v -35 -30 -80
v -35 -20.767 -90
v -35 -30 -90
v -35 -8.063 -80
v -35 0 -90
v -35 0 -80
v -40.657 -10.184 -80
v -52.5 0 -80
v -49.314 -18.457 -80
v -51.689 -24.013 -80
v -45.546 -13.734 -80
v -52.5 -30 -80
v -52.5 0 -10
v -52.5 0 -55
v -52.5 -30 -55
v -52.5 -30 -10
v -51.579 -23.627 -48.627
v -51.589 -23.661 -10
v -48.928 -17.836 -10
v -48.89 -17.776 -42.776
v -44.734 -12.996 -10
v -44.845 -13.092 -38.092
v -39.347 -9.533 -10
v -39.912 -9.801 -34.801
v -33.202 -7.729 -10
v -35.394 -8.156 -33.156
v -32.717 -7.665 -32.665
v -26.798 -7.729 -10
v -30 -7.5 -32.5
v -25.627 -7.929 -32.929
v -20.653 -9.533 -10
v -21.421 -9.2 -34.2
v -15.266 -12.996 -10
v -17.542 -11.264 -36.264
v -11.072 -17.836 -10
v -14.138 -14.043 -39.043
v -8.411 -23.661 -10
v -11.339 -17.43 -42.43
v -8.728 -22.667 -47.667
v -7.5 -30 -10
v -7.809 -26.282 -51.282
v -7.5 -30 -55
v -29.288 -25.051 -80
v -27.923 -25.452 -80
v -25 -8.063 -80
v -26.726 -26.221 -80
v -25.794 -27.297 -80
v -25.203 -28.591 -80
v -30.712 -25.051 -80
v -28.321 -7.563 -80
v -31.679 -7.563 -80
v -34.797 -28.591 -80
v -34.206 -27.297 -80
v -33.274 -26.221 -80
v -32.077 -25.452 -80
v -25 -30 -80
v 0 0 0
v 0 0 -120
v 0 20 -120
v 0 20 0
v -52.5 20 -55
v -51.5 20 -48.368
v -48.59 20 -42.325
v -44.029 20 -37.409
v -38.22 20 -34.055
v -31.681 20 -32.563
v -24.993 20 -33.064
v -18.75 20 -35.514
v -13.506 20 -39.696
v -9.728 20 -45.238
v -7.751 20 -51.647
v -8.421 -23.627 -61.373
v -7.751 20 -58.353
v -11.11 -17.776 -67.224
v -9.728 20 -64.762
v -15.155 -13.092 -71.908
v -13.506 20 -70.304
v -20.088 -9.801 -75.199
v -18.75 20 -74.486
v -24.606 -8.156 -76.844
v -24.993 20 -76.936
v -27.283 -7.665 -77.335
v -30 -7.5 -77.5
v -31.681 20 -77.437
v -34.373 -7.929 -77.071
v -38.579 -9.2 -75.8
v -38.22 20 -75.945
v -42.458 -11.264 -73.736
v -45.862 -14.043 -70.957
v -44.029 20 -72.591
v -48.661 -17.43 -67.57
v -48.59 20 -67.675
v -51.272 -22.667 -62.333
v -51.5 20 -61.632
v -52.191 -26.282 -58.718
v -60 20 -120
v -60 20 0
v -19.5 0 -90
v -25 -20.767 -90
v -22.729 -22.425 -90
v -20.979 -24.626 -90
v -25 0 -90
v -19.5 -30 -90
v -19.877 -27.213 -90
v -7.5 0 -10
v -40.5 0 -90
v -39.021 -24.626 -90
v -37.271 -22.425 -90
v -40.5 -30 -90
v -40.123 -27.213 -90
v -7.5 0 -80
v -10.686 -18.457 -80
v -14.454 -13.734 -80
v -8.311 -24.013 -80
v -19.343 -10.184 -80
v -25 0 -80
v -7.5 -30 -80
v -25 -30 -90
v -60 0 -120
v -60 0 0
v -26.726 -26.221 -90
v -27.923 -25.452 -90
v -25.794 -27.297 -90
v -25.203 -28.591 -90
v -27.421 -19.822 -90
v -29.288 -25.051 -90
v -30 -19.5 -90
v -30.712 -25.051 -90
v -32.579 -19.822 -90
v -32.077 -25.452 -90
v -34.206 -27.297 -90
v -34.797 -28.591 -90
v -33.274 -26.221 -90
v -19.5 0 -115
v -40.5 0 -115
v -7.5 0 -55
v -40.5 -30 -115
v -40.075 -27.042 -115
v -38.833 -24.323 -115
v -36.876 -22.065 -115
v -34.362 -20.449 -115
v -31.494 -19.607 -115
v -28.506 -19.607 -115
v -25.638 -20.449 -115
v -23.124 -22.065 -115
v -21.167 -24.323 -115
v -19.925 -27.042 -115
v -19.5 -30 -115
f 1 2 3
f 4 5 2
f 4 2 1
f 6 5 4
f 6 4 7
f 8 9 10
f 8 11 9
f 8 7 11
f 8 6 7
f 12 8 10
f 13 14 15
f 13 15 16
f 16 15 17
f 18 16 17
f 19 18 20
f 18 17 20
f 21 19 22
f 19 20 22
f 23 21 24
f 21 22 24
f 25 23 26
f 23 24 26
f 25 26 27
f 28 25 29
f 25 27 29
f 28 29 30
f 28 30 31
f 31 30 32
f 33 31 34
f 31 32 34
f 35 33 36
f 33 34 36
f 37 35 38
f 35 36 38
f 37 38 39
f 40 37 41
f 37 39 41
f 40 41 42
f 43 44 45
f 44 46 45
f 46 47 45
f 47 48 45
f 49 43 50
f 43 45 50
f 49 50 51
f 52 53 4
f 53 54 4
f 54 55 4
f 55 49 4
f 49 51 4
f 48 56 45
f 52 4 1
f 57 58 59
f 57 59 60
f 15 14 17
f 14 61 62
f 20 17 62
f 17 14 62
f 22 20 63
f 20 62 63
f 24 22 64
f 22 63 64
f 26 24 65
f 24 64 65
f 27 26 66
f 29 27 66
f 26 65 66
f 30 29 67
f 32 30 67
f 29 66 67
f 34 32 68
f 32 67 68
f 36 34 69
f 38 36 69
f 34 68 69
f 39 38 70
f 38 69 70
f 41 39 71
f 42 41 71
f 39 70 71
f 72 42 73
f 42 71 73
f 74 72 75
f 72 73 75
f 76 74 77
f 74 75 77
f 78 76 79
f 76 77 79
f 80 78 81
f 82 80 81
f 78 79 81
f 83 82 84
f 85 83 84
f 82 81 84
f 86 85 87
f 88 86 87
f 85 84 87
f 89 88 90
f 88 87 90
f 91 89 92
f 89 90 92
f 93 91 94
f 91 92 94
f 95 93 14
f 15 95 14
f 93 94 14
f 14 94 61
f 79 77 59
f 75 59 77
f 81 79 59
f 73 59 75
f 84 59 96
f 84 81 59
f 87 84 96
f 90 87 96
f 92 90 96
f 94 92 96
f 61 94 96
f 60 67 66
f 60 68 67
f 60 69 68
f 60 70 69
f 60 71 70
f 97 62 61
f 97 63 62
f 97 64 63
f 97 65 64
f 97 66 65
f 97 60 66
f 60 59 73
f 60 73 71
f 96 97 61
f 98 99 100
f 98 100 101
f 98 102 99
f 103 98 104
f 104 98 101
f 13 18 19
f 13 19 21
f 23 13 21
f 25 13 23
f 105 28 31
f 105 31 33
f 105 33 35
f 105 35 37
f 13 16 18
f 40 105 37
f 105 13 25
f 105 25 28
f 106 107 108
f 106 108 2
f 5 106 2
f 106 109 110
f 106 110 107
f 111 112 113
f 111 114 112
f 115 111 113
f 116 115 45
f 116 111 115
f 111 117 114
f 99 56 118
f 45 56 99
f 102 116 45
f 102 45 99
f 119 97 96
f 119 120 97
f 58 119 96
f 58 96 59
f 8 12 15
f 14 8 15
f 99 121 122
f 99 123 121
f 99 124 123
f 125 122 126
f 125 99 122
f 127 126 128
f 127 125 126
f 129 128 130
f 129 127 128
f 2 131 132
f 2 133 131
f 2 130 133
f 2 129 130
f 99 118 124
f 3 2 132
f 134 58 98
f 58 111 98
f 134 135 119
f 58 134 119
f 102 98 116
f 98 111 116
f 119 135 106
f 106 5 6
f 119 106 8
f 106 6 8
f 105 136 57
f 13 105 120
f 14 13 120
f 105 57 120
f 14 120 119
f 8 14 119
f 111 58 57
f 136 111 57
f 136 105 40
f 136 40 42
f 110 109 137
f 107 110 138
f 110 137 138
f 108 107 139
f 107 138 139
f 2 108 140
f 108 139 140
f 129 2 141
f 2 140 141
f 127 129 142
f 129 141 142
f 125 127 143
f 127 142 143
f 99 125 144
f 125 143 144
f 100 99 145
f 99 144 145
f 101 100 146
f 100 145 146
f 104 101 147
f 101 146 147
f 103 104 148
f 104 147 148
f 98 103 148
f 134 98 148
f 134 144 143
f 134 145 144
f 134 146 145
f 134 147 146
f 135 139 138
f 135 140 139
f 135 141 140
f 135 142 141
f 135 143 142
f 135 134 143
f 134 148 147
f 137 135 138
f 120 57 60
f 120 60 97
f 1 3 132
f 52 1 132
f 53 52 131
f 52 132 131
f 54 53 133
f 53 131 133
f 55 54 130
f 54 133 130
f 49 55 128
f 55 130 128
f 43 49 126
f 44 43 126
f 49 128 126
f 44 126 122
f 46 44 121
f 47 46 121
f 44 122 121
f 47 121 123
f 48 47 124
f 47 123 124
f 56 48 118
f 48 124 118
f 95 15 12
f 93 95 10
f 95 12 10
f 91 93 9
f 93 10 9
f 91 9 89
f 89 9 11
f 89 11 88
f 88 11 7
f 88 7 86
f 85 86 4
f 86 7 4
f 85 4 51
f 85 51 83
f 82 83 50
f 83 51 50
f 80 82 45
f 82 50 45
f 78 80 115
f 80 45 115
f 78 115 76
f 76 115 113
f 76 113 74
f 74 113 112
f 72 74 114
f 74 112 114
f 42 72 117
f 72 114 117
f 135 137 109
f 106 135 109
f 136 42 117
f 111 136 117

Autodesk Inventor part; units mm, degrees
ref_plane "YZ Plane" through (0, 0, 0) normal (1, 0, 0) x (0, 1, 0)
sketch "Sketch1" plane through (0, 0, 0) normal (0, 1, 0) x (-1, 0, 0)
  line L0 (0, 0) -> (60, 0)
  line L1 (60, 0) -> (60, -120)
  line L2 (60, -120) -> (0, -120)
  line L3 (0, -120) -> (0, 0)
  line L4 (30, -120) -> (30, 0)
  circle A0 centre (30, -55) radius 22.5
  line L5 (19.5, -90) -> (19.5, -115)
  line L6 (19.5, -115) -> (40.5, -115)
  line L7 (40.5, -115) -> (40.5, -90)
  line L8 (40.5, -90) -> (19.5, -90)
  line L9 (19.5, -90) -> (40.5, -115) construction
  line L10 (19.5, -115) -> (40.5, -90) construction
  line L11 (19.5, -90) -> (44.5, -90) construction
  line L12 (25, -80) -> (25, -90)
  line L13 (25, -90) -> (35, -90)
  line L14 (35, -90) -> (35, -80)
  line L15 (35, -80) -> (25, -80)
  line L16 (25, -80) -> (35, -90) construction
  line L17 (25, -90) -> (35, -80) construction
  line L18 (25, -80) -> (35, -80) construction
  line L19 (7.5, -10) -> (7.5, -80)
  line L20 (7.5, -80) -> (52.5, -80)
  line L21 (52.5, -80) -> (52.5, -10)
  line L22 (52.5, -10) -> (7.5, -10)
  line L23 (7.5, -10) -> (52.5, -80) construction
  line L24 (7.5, -80) -> (52.5, -10) construction
  line L25 (7.5, -10) -> (77.5, -10) construction
  point P0 (30, -115)
  point P1 (30, -90)
  point P2 (30, -90)
  point P3 (30, -80)
  point P4 (30, -77.5)
  point P5 (30, -25)
  point P6 (30, -102.5)
  point P7 (30, -10)
  point P8 (30, -85)
  point P9 (30, -10)
  point P10 (30, -45)
  point P11 (25, -90)
  point P12 (35, -90)
  point P13 (35, -80)
  point P14 (25, -80)
  dimension "d0" = 60
  dimension "d1" = 120
  dimension "d2" = 45
  dimension "d3" = 5
  dimension "d4" = 25
  dimension "d5" = 0
  dimension "d6" = 12.5
  dimension "d7" = 10
  dimension "d8" = 2.5
  dimension "d9" = 22.5
  dimension "d10" = -70
  dimension "d11" = 25
  dimension "d12" = 90
  dimension "d13" = 21
  dimension "d14" = 5
  dimension "d15" = 10
  dimension "d16" = 90
  dimension "d17" = 10
  dimension "d19" = -70
  dimension "d20" = 90
  dimension "d21" = -35
  dimension "d22" = 45
extrude "Extrusion1" add sketch "Sketch1" along normal blind 20
ref_plane "Work Plane1" through (0, 20, -120) normal (0, 0, -1) x (-1, 0, 0)
sketch "Sketch2" plane through (0, 20, -120) normal (0, 0, -1) x (-1, 0, 0)
  line L0 (0, -20) -> (60, -20) projected
  line L1 (60, -20) -> (60, 0) projected
  line L2 (0, 0) -> (60, 0) projected
  line L3 (0, -20) -> (0, 0) projected
  line L4 (60, -20) -> (0, -20) projected
  line L5 (0, -20) -> (60, -20)
  line L6 (60, -20) -> (60, -80)
  line L7 (60, -80) -> (0, -80)
  line L8 (0, -80) -> (0, -20)
  point P0 (30, -50)
  dimension "d25" = 60
  dimension "d26" = 60
  dimension "d27" = 30
  dimension "d28" = 30
ref_plane "Work Plane2" through (-30, -30, -120) normal (0, 1, 0) x (1, 0, 0)
extrude "Extrusion2" add sketch "Sketch1" against normal up to surface (30 mm away) contours L22 L21 A0 L4 | L4 A0 L19 L22 | A0 L4 | L4 A0 | L6 L5 L8 L4 | L4 L8 L7 L6 | A0 L21 L20 L15 L4 | L4 L15 L20 L19 A0 | L8 L12 L15 L4 | L4 L15 L14 L8
extrude "Extrusion3" cut sketch "Sketch1" along normal through all both and the other way through all contours A0 L4 | L4 A0
ref_plane "Work Plane6" through (-7.5, -30, -10) normal (0, 0, -1) x (-1, 0, 0)
ref_plane "Work Plane5" through (-7.5, -30, -80) normal (0, 0, -1) x (-1, 0, 0)
sketch "Sketch3" plane through (-40.5, -30, -115) normal (0, 0, -1) x (-1, 0, 0)
  line L0 (0, 30) -> (0, 0) projected
  circle A0 centre (-10.5, 0) radius 10.5
  point P0 (-40.5, 30)
sketch "Sketch4" plane through (-19.5, -30, -90) normal (0, 0, -1) x (-1, 0, 0)
  line L0 (5.5, 30) -> (5.5, 0) projected
  line L1 (15.5, 30) -> (15.5, 0) projected
  circle A0 centre (10.5, 0) radius 5
  point P0 (-19.5, 30)
sketch "Sketch5" plane through (-7.5, -30, -80) normal (0, 0, -1) x (-1, 0, 0)
  line L0 (0, 50) -> (45, 50) projected
  circle A0 centre (22.5, 0) radius 22.5
  point P0 (-7.5, 30)
extrude "Extrusion4" cut sketch "Sketch3" against normal up to surface (25 mm away)
extrude "Extrusion5" cut sketch "Sketch5" against normal up to surface (70 mm away)
extrude "Extrusion6" cut sketch "Sketch4" against normal up to surface (10 mm away)
ref_plane "Work Plane3" through (-40.5, -30, -115) normal (0, 0, -1) x (-1, 0, 0)
ref_plane "Work Plane4" through (-19.5, -30, -90) normal (0, 0, -1) x (-1, 0, 0)
equation "\"d4\" = d11"
equation "\"d6\" = 0.5 * d4"
equation "\"d7\" = d15"
equation "\"d9\" = 0.5 * d2"
equation "\"d14\" = 0.5 * d7"
equation "\"d19\" = d10"
equation "\"d21\" = 0.5 * d10"
equation "\"d22\" = d2"
equation "\"d25\" = d0"
equation "\"d26\" = d25"
equation "\"d27\" = 0.5 * d26"
equation "\"d28\" = 0.5 * d25"
properties part number "housing_lid_V2"
